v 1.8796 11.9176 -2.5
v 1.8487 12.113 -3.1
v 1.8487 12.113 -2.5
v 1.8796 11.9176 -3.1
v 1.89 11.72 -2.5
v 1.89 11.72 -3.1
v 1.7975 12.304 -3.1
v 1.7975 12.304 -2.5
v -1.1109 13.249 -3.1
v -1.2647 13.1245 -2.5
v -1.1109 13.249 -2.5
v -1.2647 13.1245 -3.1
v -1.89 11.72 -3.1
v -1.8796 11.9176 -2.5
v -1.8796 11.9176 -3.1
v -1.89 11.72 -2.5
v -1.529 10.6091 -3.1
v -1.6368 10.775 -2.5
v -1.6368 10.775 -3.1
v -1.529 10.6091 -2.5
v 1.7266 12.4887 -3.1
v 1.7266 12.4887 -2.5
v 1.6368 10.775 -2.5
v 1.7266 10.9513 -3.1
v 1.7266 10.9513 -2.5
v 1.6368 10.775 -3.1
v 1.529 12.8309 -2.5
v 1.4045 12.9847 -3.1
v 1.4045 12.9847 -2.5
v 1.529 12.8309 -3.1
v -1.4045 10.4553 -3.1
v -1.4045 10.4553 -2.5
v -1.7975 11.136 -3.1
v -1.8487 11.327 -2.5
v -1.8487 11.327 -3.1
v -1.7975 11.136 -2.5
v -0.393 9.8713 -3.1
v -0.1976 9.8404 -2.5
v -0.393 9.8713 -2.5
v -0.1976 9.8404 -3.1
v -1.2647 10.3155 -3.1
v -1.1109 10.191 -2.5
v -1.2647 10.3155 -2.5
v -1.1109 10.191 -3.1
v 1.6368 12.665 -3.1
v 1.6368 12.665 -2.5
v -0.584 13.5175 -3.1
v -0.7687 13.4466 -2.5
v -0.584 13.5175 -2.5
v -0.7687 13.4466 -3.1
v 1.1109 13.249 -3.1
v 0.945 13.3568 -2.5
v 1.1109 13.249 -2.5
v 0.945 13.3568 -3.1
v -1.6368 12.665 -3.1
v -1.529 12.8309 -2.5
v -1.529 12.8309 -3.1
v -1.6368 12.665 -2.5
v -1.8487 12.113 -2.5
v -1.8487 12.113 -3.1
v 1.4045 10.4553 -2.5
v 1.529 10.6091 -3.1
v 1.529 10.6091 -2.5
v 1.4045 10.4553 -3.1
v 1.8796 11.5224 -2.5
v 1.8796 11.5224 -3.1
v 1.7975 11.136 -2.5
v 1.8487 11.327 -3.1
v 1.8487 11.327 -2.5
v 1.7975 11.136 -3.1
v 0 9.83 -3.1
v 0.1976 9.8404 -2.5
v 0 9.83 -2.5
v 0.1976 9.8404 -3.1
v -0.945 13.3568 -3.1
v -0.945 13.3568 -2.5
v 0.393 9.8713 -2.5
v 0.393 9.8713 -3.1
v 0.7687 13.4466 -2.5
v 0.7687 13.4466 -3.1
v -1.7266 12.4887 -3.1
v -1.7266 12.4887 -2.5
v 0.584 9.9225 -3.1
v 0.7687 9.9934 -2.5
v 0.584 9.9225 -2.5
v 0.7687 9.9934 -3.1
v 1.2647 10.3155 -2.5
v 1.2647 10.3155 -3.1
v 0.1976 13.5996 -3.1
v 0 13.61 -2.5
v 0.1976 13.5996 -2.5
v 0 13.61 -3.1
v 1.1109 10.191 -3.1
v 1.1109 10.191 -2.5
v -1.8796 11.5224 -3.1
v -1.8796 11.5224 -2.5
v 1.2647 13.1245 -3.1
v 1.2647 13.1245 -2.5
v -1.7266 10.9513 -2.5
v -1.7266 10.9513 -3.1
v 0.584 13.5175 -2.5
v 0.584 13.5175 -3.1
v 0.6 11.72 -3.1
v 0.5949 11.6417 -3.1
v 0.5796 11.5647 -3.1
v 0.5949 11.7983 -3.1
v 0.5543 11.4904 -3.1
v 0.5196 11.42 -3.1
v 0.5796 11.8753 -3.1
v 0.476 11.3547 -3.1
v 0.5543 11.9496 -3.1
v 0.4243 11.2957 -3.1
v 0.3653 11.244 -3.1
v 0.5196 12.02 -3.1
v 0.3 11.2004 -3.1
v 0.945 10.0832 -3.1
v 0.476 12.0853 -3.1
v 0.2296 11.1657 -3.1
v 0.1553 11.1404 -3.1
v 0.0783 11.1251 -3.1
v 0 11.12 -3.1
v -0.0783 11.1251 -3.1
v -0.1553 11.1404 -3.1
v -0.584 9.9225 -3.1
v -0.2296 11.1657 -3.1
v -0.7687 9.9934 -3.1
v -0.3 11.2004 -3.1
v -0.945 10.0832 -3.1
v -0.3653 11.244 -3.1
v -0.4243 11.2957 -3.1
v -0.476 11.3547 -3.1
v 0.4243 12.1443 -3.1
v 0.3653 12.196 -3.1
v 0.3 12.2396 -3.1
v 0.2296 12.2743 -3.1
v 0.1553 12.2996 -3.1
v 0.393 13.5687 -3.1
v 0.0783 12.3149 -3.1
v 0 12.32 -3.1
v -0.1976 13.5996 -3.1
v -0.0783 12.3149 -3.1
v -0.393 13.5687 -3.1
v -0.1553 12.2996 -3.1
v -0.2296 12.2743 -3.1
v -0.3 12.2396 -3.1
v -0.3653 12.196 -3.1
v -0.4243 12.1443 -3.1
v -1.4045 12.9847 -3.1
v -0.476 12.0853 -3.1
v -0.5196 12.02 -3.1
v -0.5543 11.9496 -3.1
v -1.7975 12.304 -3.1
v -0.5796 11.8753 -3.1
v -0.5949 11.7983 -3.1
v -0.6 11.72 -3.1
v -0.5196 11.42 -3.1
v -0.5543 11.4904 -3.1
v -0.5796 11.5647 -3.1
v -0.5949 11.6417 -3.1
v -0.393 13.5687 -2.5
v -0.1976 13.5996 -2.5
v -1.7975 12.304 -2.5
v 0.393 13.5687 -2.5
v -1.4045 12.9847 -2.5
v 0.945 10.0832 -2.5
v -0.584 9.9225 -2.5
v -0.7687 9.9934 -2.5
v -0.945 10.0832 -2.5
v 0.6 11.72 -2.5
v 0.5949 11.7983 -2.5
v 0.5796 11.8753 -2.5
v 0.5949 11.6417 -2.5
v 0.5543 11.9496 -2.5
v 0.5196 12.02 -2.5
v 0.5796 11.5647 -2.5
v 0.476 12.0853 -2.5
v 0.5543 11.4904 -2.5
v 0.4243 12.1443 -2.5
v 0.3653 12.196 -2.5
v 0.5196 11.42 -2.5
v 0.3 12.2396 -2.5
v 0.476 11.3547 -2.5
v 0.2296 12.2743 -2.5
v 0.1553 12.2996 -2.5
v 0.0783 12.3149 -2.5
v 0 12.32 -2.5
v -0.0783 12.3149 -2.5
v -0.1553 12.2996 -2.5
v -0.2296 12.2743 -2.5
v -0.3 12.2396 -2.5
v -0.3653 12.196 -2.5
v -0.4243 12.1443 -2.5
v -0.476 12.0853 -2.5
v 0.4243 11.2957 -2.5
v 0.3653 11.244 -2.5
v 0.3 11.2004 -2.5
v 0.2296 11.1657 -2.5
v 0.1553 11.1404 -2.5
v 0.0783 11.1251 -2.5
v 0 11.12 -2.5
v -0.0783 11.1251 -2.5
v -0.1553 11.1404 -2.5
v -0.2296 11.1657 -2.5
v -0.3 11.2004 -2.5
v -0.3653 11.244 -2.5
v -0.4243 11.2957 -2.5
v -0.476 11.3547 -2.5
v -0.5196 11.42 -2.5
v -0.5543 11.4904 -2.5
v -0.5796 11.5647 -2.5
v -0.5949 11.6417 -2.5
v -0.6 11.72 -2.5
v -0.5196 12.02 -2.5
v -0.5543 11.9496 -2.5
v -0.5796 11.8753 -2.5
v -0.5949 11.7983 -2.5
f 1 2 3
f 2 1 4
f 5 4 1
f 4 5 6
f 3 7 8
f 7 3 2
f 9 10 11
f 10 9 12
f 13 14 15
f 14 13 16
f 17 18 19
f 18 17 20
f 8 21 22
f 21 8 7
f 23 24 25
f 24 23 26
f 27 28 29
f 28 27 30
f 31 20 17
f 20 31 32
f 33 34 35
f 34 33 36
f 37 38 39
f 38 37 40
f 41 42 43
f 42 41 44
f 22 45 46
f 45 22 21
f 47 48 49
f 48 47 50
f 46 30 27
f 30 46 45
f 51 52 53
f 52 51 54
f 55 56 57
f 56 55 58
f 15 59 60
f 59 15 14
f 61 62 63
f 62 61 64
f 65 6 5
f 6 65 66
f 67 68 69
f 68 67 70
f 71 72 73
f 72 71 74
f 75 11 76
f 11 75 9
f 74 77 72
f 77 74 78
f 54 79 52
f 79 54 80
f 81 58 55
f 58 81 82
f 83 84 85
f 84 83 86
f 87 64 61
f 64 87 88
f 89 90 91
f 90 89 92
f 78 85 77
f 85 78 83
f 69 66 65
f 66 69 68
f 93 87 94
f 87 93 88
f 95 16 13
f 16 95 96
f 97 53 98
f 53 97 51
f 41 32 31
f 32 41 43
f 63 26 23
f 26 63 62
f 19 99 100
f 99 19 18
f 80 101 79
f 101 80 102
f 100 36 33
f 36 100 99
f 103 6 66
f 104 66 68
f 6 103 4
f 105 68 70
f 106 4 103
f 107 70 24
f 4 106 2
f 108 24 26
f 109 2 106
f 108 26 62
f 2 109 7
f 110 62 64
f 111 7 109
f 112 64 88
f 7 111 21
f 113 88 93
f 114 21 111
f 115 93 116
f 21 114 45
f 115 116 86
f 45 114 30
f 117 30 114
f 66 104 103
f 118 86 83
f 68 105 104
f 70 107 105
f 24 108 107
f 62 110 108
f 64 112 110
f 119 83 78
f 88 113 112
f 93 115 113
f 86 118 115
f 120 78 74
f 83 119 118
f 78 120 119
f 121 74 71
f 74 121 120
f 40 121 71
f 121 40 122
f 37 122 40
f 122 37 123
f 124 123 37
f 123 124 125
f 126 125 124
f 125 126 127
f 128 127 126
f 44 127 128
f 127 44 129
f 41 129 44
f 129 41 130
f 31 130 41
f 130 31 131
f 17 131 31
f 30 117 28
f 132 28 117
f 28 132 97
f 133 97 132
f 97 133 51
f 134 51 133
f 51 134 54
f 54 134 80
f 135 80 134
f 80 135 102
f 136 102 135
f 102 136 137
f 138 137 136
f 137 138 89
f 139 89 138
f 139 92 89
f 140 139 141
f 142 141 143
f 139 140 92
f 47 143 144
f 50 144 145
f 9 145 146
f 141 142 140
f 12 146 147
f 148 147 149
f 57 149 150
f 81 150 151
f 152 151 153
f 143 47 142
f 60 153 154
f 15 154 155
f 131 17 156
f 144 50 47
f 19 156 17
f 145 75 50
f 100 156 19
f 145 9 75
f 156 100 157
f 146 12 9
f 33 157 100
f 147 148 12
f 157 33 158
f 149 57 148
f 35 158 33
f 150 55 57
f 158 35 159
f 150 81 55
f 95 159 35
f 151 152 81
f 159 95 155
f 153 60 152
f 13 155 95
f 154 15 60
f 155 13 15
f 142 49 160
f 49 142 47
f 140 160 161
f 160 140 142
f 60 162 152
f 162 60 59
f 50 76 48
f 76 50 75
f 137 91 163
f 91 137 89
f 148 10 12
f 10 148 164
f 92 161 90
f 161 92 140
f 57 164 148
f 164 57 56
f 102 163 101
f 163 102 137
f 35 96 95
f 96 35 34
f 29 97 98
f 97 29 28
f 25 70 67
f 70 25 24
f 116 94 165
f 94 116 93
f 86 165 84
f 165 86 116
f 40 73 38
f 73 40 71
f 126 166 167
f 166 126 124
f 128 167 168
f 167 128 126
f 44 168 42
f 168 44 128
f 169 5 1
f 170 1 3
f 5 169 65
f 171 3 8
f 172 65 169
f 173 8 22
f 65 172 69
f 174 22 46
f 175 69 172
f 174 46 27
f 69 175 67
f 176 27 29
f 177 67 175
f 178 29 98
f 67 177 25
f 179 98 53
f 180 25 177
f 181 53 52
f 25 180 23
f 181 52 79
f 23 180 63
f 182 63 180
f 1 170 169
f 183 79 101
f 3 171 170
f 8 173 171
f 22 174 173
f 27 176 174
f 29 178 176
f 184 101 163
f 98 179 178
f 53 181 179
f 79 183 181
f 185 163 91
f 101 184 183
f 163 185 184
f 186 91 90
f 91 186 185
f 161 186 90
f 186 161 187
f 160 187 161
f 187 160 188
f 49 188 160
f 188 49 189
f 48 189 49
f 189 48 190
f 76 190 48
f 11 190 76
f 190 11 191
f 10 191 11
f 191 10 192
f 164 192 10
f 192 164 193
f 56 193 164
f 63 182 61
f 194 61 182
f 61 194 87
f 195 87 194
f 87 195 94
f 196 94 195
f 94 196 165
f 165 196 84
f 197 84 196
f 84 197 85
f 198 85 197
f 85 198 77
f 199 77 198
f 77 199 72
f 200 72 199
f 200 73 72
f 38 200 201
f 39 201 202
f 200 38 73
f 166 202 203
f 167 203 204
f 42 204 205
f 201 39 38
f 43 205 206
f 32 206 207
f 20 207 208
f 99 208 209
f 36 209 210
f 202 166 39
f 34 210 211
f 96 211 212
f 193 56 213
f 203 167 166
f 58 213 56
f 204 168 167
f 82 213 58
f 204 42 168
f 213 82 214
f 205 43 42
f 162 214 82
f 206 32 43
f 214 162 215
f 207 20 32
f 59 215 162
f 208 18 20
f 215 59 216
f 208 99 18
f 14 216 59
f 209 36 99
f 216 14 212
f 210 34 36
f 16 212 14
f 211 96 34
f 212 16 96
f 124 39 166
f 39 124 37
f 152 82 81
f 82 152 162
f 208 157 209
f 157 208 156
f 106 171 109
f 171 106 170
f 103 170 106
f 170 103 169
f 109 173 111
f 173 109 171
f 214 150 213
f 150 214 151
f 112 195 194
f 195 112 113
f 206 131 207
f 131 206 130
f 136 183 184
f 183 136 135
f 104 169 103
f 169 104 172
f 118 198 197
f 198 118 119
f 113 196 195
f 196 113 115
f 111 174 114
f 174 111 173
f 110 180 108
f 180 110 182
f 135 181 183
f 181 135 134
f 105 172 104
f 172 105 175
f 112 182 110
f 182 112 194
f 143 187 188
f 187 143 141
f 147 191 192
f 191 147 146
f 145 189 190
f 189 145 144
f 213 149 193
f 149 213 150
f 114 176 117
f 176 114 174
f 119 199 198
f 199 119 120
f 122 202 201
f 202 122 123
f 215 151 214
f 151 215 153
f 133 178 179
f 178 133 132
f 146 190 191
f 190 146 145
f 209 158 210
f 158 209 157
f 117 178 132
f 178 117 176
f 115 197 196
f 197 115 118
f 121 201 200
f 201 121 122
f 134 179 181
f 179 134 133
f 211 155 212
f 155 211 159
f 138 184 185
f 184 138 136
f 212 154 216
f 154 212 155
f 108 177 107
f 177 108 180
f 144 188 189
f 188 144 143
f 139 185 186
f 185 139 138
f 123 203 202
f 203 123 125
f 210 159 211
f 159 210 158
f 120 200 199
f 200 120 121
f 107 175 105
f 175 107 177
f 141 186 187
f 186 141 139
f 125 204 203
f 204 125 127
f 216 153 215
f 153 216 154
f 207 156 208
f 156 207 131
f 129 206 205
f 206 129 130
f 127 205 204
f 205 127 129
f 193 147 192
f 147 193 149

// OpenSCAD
// file: ch1_03c_params.scad
// CH1 03C 单排滚子链 — 尺寸真值源：docs/parts/CH1-03C-roller-chain.md
// 单位：毫米。这是外购碳钢链条的 CAD 包络，不是 FDM 打印件。

//#region 导入/依赖
// 无外部库；几何由本文件常数驱动。
//#endregion

//#region 常量/配置
P = 4.7625;          // 节距：系列表 / SKU 210L（图面写 4.762）
h2 = 4.3;            // 内链板高度 h2（卖家图 + ISO h2 max）
d1 = 2.48;           // 03C 图面「滚子」= ISO 套筒外径 d1 max（本规格无独立滚子）
d2 = 1.62;           // 销轴直径 d2 max
Lc = 6.9;            // ISO / 图面销轴总长 Lc max；装配外形用贴板铆头，不把细杆伸出这么长
L = 6.10;            // 铆头内侧销长 L max（ISO，图面未标数）
T = 0.6;             // 链板厚度 T max
b1 = 2.38;           // 内节内宽 b1 min（ISO；图面有符号无数字）
waist = 2.6;         // 链板腰宽：按卖家 8 字外形，不是标准表列
rivet_d = 2.15;      // 铆头直径：按侧视铆头 > d2
rivet_h = 0.40;      // 贴在外板外侧的铆头高度；避免 (Lc-L)/2 拉出细 stem
fillet = 0.42;       // 腰部凹圆角
roller_end_gap = 0.02;  // 仅 CSG 间隙，不留可见轴向窜动
journal_od = 2.05;      // 穿内板轴颈；可见鼓面仍用 d1
links_sku = 210;

inner_width = b1;
bushing_od = journal_od;
plate_stack = inner_width + 4 * T;
outer_face = plate_stack / 2;
pin_length = plate_stack + 2 * rivet_h;
visible_bush_len = inner_width - 2 * roller_end_gap;
clearance = 0.04;
eps = 0.05;
//#endregion

//#region 模型/类型
// 无独立类型；零件由 inner/outer plate、roller、pin、bushing 组成。
//#endregion

//#region 私有成员
// 几何常数全部公开给根模型 include。
//#endregion

//#region 公开 API
// include 后直接使用 P / h2 / d1 / d2 / pin_length / T。
//#endregion

//#region 业务逻辑
// SKU 210L × 4.7625 mm = 1000.125 mm。
// b1 / L 图面未标数，取 ISO 03C min/max；链板腰宽按卖家 8 字外形。
// 可见套筒长度必须是 b1，不是 b1+2T；后者会从斜向看成过长的连接棍。
// 销轴细杆只穿过板叠；铆头贴外板。Lc=6.9 是规格上限，不是要把 stem 拉到 6.9。
//#endregion

//#region 方法/工具
// 无。
//#endregion
// file: parts/ch1_03c_connecting_link_params.scad
// CH1 03C 连接节五金 — 由 docs/parts/CH1-03C-roller-chain.md 参数化
// 单位：毫米。03C 链条本体是外购碳钢件；这里是连接节穿销/弹片的参考模型。

//#region 导入/依赖
include <../ch1_03c_params.scad>
//#endregion

//#region 常量/配置
$fa = 6;
$fs = 0.08;

// 文档明确给出的连接节主尺寸。
CONNECTING_PIN_PAIR_SPACING = P;       // 两根穿销的中心距 = 链条节距
CONNECTING_PIN_SHAFT_D = d2;           // 03C 销轴直径
CONNECTING_PIN_LENGTH = Lc;            // 03C 图面销轴总长
CONNECTING_PIN_HEAD_D = rivet_d;       // 固定端圆头的参考直径
CONNECTING_PIN_HEAD_H = rivet_h;

// 卖家文档没有给 03C CL 卡簧的完整展开图；以下是按用户提供的
// 「加长销/加长销带挡板」图和实物照片建立的装配参考假设。
// 卡簧按用户给出的实物轮廓建模：右端敞口；两根销的位置各有一段围绕销槽
// 的圆弧，圆弧之间由上下两条收腰弹臂连接。它不是等宽 U 槽，也不是两个
// 独立的 C 形耳片或实心连接链板。
CONNECTING_PIN_GROOVE_D = 1.20;
RETAINING_CLIP_T = T;                 // 03C 片厚；图示 04C 的 T=0.8 不套用
// 槽宽要覆盖整片厚度，并留少量侧向装配余量；原 0.34 mm 小于片厚，不能落槽。
CONNECTING_PIN_GROOVE_W = RETAINING_CLIP_T + 0.12;
CONNECTING_PIN_GROOVE_FROM_TIP = 0.48;
CONNECTING_PIN_GROOVE_CENTER = CONNECTING_PIN_LENGTH / 2 - CONNECTING_PIN_GROOVE_FROM_TIP;
CONNECTING_LINK_EPS = 0.05;
RETAINING_CLIP_H = h2;                // 外轮廓高度，沿用连接节链板高度
RETAINING_CLIP_OUTER_R = RETAINING_CLIP_H / 2;
RETAINING_CLIP_PIN_ARC_INNER_R = CONNECTING_PIN_GROOVE_D / 2 + 0.05;
RETAINING_CLIP_CLOSED_PIN_X = -CONNECTING_PIN_PAIR_SPACING / 2;
RETAINING_CLIP_OPEN_PIN_X = CONNECTING_PIN_PAIR_SPACING / 2;
// 右侧两段圆弧的末端张开到槽底直径附近，但小于完整销身直径，形成锁止口。
RETAINING_CLIP_OPEN_HALF_ANGLE = 68;
RETAINING_CLIP_THROAT_GAP_H = 2 * RETAINING_CLIP_PIN_ARC_INNER_R * sin(RETAINING_CLIP_OPEN_HALF_ANGLE);
RETAINING_CLIP_OPEN_TIP_X = RETAINING_CLIP_OPEN_PIN_X + RETAINING_CLIP_OUTER_R + CONNECTING_LINK_EPS;
// 中间开口在两销之间放宽，在销位处收回到圆弧；这样圆弧不会被直线开口吞掉。
RETAINING_CLIP_SLOT_CENTER_HALF_H = 1.05;
RETAINING_CLIP_PIN_JOIN_HALF_H = 0.55;
RETAINING_CLIP_SLOT_RAMP_X = 0.85;
RETAINING_CLIP_PIN_JOIN_DX = sqrt(
    RETAINING_CLIP_PIN_ARC_INNER_R * RETAINING_CLIP_PIN_ARC_INNER_R
    - RETAINING_CLIP_PIN_JOIN_HALF_H * RETAINING_CLIP_PIN_JOIN_HALF_H
);
RETAINING_CLIP_LEFT_JOIN_X = RETAINING_CLIP_CLOSED_PIN_X + RETAINING_CLIP_PIN_JOIN_DX;
RETAINING_CLIP_RIGHT_JOIN_X = RETAINING_CLIP_OPEN_PIN_X - RETAINING_CLIP_PIN_JOIN_DX;
RETAINING_CLIP_LEFT_RAMP_X = RETAINING_CLIP_CLOSED_PIN_X + RETAINING_CLIP_SLOT_RAMP_X;
RETAINING_CLIP_RIGHT_RAMP_X = RETAINING_CLIP_OPEN_PIN_X - RETAINING_CLIP_SLOT_RAMP_X;
RETAINING_CLIP_OPEN_HALF_H = RETAINING_CLIP_THROAT_GAP_H / 2;
//#endregion

//#region 模型/类型
// 连接节局部坐标：两销中心位于 x=±P/2，销轴沿 +Y；固定头在 -Y 端。
// 弹片位于 +Y 端槽内：局部 -X 是闭合圆弧端，局部 +X 是两段圆弧形成的敞口端；
// 两弹臂从闭端向开口侧销逐渐收腰，右侧圆弧的内缘落入销轴环槽。
// 独立打印时绕 X 轴旋转 90° 铺平。
//#endregion

//#region 公开 API
// include 后可调用 ch1_03c_connecting_pin_pair()、ch1_03c_retaining_clip()。
//#endregion

//#region 私有成员
module connecting_pin_groove_cut(x) {
    translate([
        x,
        CONNECTING_PIN_GROOVE_CENTER - CONNECTING_PIN_GROOVE_W / 2,
        0
    ])
        rotate([-90, 0, 0])
            difference() {
                cylinder(
                    d = CONNECTING_PIN_SHAFT_D + 0.60,
                    h = CONNECTING_PIN_GROOVE_W
                );
                translate([0, 0, -CONNECTING_LINK_EPS])
                    cylinder(
                        d = CONNECTING_PIN_GROOVE_D,
                        h = CONNECTING_PIN_GROOVE_W + 2 * CONNECTING_LINK_EPS
                    );
            }
}

module connecting_pin_one(x) {
    difference() {
        union() {
            translate([x, -CONNECTING_PIN_LENGTH / 2, 0])
                rotate([-90, 0, 0])
                    cylinder(d = CONNECTING_PIN_SHAFT_D, h = CONNECTING_PIN_LENGTH);
            translate([x, -CONNECTING_PIN_LENGTH / 2, 0])
                rotate([-90, 0, 0])
                    cylinder(d = CONNECTING_PIN_HEAD_D, h = CONNECTING_PIN_HEAD_H);
        }
        connecting_pin_groove_cut(x);
    }
}

module retaining_clip_outer_profile_2d() {
    // 绿色箭头所示的外轮廓：两销中心同轴的长圆外廓，右端由内腔切开。
    union() {
        translate([RETAINING_CLIP_CLOSED_PIN_X, 0])
            circle(r = RETAINING_CLIP_OUTER_R);
        translate([RETAINING_CLIP_OPEN_PIN_X, 0])
            circle(r = RETAINING_CLIP_OUTER_R);
        translate([RETAINING_CLIP_CLOSED_PIN_X, -RETAINING_CLIP_OUTER_R])
            square([
                CONNECTING_PIN_PAIR_SPACING,
                2 * RETAINING_CLIP_OUTER_R
            ]);
    }
}

module retaining_clip_opening_2d() {
    // 绿色箭头所示的内轮廓：左销位圆弧 → 放宽的中间段 → 右销位圆弧 → 右端开口。
    // 直线在圆弧的上/下交点处过渡，不能从销中心直接切过去。
    union() {
        translate([RETAINING_CLIP_CLOSED_PIN_X, 0])
            circle(r = RETAINING_CLIP_PIN_ARC_INNER_R);
        translate([RETAINING_CLIP_OPEN_PIN_X, 0])
            circle(r = RETAINING_CLIP_PIN_ARC_INNER_R);
        polygon([
            [RETAINING_CLIP_LEFT_JOIN_X, -RETAINING_CLIP_PIN_JOIN_HALF_H],
            [RETAINING_CLIP_LEFT_RAMP_X, -RETAINING_CLIP_SLOT_CENTER_HALF_H],
            [RETAINING_CLIP_RIGHT_RAMP_X, -RETAINING_CLIP_SLOT_CENTER_HALF_H],
            [RETAINING_CLIP_RIGHT_JOIN_X, -RETAINING_CLIP_PIN_JOIN_HALF_H],
            [RETAINING_CLIP_OPEN_TIP_X, -RETAINING_CLIP_OPEN_HALF_H],
            [RETAINING_CLIP_OPEN_TIP_X, RETAINING_CLIP_OPEN_HALF_H],
            [RETAINING_CLIP_RIGHT_JOIN_X, RETAINING_CLIP_PIN_JOIN_HALF_H],
            [RETAINING_CLIP_RIGHT_RAMP_X, RETAINING_CLIP_SLOT_CENTER_HALF_H],
            [RETAINING_CLIP_LEFT_RAMP_X, RETAINING_CLIP_SLOT_CENTER_HALF_H],
            [RETAINING_CLIP_LEFT_JOIN_X, RETAINING_CLIP_PIN_JOIN_HALF_H]
        ]);
    }
}

module retaining_clip_profile_2d() {
    union() {
        difference() {
            retaining_clip_outer_profile_2d();
            retaining_clip_opening_2d();
        }
    }
}
//#endregion

//#region 业务逻辑
module ch1_03c_connecting_pin_pair() {
    for (x = [-CONNECTING_PIN_PAIR_SPACING / 2, CONNECTING_PIN_PAIR_SPACING / 2])
        connecting_pin_one(x);
}

module ch1_03c_retaining_clip() {
    // 与双销保持同一装配坐标；单独打印时应将夹片绕 X 轴旋转 90° 铺平。
    translate([0, CONNECTING_PIN_GROOVE_CENTER, 0])
        rotate([90, 0, 0])
            linear_extrude(
                height = RETAINING_CLIP_T,
                center = true,
                convexity = 6
            )
                retaining_clip_profile_2d();
}

module ch1_03c_connecting_link_reference() {
    color("#b08d57") ch1_03c_connecting_pin_pair();
    color("#9aa7b6") ch1_03c_retaining_clip();
}
//#endregion

//#region 方法/工具
assert(CONNECTING_PIN_GROOVE_W > RETAINING_CLIP_T);
assert(RETAINING_CLIP_THROAT_GAP_H > CONNECTING_PIN_GROOVE_D - 0.01);
assert(RETAINING_CLIP_THROAT_GAP_H < CONNECTING_PIN_SHAFT_D);
assert(RETAINING_CLIP_CLOSED_PIN_X < RETAINING_CLIP_OPEN_PIN_X);
assert(RETAINING_CLIP_OPEN_TIP_X > RETAINING_CLIP_OPEN_PIN_X);
assert(RETAINING_CLIP_PIN_JOIN_HALF_H < RETAINING_CLIP_PIN_ARC_INNER_R);
assert(RETAINING_CLIP_LEFT_JOIN_X < RETAINING_CLIP_LEFT_RAMP_X);
assert(RETAINING_CLIP_RIGHT_RAMP_X < RETAINING_CLIP_RIGHT_JOIN_X);
assert(RETAINING_CLIP_SLOT_CENTER_HALF_H > RETAINING_CLIP_PIN_JOIN_HALF_H);
assert(RETAINING_CLIP_OPEN_HALF_H < RETAINING_CLIP_PIN_ARC_INNER_R);
// 此文件是库；独立导出入口见 cad/openscad/ch1_03c_connecting_pin.scad
// 和 cad/openscad/ch1_03c_retaining_clip.scad。
//#endregion
// main file
// CH1 03C 681 离合轴承下承托环 — 独立模型库/打印入口

//#region 导入/依赖
include <parts/ch1_03c_extended_link_params.scad>
//#endregion

//#region 常量/配置
PART = is_undef(PART) ? "retainer" : PART;
//#endregion

//#region 公开 API
if (PART == "retainer")
    ch1_03c_clutch_bearing_retainer();
else if (PART == "assembly")
    ch1_03c_extended_link_reference();
//#endregion

//#region 业务逻辑
// 轴承从平台下方装入后，承托环用压配或少量胶固定；轴向沿世界 Z。
//#endregion
